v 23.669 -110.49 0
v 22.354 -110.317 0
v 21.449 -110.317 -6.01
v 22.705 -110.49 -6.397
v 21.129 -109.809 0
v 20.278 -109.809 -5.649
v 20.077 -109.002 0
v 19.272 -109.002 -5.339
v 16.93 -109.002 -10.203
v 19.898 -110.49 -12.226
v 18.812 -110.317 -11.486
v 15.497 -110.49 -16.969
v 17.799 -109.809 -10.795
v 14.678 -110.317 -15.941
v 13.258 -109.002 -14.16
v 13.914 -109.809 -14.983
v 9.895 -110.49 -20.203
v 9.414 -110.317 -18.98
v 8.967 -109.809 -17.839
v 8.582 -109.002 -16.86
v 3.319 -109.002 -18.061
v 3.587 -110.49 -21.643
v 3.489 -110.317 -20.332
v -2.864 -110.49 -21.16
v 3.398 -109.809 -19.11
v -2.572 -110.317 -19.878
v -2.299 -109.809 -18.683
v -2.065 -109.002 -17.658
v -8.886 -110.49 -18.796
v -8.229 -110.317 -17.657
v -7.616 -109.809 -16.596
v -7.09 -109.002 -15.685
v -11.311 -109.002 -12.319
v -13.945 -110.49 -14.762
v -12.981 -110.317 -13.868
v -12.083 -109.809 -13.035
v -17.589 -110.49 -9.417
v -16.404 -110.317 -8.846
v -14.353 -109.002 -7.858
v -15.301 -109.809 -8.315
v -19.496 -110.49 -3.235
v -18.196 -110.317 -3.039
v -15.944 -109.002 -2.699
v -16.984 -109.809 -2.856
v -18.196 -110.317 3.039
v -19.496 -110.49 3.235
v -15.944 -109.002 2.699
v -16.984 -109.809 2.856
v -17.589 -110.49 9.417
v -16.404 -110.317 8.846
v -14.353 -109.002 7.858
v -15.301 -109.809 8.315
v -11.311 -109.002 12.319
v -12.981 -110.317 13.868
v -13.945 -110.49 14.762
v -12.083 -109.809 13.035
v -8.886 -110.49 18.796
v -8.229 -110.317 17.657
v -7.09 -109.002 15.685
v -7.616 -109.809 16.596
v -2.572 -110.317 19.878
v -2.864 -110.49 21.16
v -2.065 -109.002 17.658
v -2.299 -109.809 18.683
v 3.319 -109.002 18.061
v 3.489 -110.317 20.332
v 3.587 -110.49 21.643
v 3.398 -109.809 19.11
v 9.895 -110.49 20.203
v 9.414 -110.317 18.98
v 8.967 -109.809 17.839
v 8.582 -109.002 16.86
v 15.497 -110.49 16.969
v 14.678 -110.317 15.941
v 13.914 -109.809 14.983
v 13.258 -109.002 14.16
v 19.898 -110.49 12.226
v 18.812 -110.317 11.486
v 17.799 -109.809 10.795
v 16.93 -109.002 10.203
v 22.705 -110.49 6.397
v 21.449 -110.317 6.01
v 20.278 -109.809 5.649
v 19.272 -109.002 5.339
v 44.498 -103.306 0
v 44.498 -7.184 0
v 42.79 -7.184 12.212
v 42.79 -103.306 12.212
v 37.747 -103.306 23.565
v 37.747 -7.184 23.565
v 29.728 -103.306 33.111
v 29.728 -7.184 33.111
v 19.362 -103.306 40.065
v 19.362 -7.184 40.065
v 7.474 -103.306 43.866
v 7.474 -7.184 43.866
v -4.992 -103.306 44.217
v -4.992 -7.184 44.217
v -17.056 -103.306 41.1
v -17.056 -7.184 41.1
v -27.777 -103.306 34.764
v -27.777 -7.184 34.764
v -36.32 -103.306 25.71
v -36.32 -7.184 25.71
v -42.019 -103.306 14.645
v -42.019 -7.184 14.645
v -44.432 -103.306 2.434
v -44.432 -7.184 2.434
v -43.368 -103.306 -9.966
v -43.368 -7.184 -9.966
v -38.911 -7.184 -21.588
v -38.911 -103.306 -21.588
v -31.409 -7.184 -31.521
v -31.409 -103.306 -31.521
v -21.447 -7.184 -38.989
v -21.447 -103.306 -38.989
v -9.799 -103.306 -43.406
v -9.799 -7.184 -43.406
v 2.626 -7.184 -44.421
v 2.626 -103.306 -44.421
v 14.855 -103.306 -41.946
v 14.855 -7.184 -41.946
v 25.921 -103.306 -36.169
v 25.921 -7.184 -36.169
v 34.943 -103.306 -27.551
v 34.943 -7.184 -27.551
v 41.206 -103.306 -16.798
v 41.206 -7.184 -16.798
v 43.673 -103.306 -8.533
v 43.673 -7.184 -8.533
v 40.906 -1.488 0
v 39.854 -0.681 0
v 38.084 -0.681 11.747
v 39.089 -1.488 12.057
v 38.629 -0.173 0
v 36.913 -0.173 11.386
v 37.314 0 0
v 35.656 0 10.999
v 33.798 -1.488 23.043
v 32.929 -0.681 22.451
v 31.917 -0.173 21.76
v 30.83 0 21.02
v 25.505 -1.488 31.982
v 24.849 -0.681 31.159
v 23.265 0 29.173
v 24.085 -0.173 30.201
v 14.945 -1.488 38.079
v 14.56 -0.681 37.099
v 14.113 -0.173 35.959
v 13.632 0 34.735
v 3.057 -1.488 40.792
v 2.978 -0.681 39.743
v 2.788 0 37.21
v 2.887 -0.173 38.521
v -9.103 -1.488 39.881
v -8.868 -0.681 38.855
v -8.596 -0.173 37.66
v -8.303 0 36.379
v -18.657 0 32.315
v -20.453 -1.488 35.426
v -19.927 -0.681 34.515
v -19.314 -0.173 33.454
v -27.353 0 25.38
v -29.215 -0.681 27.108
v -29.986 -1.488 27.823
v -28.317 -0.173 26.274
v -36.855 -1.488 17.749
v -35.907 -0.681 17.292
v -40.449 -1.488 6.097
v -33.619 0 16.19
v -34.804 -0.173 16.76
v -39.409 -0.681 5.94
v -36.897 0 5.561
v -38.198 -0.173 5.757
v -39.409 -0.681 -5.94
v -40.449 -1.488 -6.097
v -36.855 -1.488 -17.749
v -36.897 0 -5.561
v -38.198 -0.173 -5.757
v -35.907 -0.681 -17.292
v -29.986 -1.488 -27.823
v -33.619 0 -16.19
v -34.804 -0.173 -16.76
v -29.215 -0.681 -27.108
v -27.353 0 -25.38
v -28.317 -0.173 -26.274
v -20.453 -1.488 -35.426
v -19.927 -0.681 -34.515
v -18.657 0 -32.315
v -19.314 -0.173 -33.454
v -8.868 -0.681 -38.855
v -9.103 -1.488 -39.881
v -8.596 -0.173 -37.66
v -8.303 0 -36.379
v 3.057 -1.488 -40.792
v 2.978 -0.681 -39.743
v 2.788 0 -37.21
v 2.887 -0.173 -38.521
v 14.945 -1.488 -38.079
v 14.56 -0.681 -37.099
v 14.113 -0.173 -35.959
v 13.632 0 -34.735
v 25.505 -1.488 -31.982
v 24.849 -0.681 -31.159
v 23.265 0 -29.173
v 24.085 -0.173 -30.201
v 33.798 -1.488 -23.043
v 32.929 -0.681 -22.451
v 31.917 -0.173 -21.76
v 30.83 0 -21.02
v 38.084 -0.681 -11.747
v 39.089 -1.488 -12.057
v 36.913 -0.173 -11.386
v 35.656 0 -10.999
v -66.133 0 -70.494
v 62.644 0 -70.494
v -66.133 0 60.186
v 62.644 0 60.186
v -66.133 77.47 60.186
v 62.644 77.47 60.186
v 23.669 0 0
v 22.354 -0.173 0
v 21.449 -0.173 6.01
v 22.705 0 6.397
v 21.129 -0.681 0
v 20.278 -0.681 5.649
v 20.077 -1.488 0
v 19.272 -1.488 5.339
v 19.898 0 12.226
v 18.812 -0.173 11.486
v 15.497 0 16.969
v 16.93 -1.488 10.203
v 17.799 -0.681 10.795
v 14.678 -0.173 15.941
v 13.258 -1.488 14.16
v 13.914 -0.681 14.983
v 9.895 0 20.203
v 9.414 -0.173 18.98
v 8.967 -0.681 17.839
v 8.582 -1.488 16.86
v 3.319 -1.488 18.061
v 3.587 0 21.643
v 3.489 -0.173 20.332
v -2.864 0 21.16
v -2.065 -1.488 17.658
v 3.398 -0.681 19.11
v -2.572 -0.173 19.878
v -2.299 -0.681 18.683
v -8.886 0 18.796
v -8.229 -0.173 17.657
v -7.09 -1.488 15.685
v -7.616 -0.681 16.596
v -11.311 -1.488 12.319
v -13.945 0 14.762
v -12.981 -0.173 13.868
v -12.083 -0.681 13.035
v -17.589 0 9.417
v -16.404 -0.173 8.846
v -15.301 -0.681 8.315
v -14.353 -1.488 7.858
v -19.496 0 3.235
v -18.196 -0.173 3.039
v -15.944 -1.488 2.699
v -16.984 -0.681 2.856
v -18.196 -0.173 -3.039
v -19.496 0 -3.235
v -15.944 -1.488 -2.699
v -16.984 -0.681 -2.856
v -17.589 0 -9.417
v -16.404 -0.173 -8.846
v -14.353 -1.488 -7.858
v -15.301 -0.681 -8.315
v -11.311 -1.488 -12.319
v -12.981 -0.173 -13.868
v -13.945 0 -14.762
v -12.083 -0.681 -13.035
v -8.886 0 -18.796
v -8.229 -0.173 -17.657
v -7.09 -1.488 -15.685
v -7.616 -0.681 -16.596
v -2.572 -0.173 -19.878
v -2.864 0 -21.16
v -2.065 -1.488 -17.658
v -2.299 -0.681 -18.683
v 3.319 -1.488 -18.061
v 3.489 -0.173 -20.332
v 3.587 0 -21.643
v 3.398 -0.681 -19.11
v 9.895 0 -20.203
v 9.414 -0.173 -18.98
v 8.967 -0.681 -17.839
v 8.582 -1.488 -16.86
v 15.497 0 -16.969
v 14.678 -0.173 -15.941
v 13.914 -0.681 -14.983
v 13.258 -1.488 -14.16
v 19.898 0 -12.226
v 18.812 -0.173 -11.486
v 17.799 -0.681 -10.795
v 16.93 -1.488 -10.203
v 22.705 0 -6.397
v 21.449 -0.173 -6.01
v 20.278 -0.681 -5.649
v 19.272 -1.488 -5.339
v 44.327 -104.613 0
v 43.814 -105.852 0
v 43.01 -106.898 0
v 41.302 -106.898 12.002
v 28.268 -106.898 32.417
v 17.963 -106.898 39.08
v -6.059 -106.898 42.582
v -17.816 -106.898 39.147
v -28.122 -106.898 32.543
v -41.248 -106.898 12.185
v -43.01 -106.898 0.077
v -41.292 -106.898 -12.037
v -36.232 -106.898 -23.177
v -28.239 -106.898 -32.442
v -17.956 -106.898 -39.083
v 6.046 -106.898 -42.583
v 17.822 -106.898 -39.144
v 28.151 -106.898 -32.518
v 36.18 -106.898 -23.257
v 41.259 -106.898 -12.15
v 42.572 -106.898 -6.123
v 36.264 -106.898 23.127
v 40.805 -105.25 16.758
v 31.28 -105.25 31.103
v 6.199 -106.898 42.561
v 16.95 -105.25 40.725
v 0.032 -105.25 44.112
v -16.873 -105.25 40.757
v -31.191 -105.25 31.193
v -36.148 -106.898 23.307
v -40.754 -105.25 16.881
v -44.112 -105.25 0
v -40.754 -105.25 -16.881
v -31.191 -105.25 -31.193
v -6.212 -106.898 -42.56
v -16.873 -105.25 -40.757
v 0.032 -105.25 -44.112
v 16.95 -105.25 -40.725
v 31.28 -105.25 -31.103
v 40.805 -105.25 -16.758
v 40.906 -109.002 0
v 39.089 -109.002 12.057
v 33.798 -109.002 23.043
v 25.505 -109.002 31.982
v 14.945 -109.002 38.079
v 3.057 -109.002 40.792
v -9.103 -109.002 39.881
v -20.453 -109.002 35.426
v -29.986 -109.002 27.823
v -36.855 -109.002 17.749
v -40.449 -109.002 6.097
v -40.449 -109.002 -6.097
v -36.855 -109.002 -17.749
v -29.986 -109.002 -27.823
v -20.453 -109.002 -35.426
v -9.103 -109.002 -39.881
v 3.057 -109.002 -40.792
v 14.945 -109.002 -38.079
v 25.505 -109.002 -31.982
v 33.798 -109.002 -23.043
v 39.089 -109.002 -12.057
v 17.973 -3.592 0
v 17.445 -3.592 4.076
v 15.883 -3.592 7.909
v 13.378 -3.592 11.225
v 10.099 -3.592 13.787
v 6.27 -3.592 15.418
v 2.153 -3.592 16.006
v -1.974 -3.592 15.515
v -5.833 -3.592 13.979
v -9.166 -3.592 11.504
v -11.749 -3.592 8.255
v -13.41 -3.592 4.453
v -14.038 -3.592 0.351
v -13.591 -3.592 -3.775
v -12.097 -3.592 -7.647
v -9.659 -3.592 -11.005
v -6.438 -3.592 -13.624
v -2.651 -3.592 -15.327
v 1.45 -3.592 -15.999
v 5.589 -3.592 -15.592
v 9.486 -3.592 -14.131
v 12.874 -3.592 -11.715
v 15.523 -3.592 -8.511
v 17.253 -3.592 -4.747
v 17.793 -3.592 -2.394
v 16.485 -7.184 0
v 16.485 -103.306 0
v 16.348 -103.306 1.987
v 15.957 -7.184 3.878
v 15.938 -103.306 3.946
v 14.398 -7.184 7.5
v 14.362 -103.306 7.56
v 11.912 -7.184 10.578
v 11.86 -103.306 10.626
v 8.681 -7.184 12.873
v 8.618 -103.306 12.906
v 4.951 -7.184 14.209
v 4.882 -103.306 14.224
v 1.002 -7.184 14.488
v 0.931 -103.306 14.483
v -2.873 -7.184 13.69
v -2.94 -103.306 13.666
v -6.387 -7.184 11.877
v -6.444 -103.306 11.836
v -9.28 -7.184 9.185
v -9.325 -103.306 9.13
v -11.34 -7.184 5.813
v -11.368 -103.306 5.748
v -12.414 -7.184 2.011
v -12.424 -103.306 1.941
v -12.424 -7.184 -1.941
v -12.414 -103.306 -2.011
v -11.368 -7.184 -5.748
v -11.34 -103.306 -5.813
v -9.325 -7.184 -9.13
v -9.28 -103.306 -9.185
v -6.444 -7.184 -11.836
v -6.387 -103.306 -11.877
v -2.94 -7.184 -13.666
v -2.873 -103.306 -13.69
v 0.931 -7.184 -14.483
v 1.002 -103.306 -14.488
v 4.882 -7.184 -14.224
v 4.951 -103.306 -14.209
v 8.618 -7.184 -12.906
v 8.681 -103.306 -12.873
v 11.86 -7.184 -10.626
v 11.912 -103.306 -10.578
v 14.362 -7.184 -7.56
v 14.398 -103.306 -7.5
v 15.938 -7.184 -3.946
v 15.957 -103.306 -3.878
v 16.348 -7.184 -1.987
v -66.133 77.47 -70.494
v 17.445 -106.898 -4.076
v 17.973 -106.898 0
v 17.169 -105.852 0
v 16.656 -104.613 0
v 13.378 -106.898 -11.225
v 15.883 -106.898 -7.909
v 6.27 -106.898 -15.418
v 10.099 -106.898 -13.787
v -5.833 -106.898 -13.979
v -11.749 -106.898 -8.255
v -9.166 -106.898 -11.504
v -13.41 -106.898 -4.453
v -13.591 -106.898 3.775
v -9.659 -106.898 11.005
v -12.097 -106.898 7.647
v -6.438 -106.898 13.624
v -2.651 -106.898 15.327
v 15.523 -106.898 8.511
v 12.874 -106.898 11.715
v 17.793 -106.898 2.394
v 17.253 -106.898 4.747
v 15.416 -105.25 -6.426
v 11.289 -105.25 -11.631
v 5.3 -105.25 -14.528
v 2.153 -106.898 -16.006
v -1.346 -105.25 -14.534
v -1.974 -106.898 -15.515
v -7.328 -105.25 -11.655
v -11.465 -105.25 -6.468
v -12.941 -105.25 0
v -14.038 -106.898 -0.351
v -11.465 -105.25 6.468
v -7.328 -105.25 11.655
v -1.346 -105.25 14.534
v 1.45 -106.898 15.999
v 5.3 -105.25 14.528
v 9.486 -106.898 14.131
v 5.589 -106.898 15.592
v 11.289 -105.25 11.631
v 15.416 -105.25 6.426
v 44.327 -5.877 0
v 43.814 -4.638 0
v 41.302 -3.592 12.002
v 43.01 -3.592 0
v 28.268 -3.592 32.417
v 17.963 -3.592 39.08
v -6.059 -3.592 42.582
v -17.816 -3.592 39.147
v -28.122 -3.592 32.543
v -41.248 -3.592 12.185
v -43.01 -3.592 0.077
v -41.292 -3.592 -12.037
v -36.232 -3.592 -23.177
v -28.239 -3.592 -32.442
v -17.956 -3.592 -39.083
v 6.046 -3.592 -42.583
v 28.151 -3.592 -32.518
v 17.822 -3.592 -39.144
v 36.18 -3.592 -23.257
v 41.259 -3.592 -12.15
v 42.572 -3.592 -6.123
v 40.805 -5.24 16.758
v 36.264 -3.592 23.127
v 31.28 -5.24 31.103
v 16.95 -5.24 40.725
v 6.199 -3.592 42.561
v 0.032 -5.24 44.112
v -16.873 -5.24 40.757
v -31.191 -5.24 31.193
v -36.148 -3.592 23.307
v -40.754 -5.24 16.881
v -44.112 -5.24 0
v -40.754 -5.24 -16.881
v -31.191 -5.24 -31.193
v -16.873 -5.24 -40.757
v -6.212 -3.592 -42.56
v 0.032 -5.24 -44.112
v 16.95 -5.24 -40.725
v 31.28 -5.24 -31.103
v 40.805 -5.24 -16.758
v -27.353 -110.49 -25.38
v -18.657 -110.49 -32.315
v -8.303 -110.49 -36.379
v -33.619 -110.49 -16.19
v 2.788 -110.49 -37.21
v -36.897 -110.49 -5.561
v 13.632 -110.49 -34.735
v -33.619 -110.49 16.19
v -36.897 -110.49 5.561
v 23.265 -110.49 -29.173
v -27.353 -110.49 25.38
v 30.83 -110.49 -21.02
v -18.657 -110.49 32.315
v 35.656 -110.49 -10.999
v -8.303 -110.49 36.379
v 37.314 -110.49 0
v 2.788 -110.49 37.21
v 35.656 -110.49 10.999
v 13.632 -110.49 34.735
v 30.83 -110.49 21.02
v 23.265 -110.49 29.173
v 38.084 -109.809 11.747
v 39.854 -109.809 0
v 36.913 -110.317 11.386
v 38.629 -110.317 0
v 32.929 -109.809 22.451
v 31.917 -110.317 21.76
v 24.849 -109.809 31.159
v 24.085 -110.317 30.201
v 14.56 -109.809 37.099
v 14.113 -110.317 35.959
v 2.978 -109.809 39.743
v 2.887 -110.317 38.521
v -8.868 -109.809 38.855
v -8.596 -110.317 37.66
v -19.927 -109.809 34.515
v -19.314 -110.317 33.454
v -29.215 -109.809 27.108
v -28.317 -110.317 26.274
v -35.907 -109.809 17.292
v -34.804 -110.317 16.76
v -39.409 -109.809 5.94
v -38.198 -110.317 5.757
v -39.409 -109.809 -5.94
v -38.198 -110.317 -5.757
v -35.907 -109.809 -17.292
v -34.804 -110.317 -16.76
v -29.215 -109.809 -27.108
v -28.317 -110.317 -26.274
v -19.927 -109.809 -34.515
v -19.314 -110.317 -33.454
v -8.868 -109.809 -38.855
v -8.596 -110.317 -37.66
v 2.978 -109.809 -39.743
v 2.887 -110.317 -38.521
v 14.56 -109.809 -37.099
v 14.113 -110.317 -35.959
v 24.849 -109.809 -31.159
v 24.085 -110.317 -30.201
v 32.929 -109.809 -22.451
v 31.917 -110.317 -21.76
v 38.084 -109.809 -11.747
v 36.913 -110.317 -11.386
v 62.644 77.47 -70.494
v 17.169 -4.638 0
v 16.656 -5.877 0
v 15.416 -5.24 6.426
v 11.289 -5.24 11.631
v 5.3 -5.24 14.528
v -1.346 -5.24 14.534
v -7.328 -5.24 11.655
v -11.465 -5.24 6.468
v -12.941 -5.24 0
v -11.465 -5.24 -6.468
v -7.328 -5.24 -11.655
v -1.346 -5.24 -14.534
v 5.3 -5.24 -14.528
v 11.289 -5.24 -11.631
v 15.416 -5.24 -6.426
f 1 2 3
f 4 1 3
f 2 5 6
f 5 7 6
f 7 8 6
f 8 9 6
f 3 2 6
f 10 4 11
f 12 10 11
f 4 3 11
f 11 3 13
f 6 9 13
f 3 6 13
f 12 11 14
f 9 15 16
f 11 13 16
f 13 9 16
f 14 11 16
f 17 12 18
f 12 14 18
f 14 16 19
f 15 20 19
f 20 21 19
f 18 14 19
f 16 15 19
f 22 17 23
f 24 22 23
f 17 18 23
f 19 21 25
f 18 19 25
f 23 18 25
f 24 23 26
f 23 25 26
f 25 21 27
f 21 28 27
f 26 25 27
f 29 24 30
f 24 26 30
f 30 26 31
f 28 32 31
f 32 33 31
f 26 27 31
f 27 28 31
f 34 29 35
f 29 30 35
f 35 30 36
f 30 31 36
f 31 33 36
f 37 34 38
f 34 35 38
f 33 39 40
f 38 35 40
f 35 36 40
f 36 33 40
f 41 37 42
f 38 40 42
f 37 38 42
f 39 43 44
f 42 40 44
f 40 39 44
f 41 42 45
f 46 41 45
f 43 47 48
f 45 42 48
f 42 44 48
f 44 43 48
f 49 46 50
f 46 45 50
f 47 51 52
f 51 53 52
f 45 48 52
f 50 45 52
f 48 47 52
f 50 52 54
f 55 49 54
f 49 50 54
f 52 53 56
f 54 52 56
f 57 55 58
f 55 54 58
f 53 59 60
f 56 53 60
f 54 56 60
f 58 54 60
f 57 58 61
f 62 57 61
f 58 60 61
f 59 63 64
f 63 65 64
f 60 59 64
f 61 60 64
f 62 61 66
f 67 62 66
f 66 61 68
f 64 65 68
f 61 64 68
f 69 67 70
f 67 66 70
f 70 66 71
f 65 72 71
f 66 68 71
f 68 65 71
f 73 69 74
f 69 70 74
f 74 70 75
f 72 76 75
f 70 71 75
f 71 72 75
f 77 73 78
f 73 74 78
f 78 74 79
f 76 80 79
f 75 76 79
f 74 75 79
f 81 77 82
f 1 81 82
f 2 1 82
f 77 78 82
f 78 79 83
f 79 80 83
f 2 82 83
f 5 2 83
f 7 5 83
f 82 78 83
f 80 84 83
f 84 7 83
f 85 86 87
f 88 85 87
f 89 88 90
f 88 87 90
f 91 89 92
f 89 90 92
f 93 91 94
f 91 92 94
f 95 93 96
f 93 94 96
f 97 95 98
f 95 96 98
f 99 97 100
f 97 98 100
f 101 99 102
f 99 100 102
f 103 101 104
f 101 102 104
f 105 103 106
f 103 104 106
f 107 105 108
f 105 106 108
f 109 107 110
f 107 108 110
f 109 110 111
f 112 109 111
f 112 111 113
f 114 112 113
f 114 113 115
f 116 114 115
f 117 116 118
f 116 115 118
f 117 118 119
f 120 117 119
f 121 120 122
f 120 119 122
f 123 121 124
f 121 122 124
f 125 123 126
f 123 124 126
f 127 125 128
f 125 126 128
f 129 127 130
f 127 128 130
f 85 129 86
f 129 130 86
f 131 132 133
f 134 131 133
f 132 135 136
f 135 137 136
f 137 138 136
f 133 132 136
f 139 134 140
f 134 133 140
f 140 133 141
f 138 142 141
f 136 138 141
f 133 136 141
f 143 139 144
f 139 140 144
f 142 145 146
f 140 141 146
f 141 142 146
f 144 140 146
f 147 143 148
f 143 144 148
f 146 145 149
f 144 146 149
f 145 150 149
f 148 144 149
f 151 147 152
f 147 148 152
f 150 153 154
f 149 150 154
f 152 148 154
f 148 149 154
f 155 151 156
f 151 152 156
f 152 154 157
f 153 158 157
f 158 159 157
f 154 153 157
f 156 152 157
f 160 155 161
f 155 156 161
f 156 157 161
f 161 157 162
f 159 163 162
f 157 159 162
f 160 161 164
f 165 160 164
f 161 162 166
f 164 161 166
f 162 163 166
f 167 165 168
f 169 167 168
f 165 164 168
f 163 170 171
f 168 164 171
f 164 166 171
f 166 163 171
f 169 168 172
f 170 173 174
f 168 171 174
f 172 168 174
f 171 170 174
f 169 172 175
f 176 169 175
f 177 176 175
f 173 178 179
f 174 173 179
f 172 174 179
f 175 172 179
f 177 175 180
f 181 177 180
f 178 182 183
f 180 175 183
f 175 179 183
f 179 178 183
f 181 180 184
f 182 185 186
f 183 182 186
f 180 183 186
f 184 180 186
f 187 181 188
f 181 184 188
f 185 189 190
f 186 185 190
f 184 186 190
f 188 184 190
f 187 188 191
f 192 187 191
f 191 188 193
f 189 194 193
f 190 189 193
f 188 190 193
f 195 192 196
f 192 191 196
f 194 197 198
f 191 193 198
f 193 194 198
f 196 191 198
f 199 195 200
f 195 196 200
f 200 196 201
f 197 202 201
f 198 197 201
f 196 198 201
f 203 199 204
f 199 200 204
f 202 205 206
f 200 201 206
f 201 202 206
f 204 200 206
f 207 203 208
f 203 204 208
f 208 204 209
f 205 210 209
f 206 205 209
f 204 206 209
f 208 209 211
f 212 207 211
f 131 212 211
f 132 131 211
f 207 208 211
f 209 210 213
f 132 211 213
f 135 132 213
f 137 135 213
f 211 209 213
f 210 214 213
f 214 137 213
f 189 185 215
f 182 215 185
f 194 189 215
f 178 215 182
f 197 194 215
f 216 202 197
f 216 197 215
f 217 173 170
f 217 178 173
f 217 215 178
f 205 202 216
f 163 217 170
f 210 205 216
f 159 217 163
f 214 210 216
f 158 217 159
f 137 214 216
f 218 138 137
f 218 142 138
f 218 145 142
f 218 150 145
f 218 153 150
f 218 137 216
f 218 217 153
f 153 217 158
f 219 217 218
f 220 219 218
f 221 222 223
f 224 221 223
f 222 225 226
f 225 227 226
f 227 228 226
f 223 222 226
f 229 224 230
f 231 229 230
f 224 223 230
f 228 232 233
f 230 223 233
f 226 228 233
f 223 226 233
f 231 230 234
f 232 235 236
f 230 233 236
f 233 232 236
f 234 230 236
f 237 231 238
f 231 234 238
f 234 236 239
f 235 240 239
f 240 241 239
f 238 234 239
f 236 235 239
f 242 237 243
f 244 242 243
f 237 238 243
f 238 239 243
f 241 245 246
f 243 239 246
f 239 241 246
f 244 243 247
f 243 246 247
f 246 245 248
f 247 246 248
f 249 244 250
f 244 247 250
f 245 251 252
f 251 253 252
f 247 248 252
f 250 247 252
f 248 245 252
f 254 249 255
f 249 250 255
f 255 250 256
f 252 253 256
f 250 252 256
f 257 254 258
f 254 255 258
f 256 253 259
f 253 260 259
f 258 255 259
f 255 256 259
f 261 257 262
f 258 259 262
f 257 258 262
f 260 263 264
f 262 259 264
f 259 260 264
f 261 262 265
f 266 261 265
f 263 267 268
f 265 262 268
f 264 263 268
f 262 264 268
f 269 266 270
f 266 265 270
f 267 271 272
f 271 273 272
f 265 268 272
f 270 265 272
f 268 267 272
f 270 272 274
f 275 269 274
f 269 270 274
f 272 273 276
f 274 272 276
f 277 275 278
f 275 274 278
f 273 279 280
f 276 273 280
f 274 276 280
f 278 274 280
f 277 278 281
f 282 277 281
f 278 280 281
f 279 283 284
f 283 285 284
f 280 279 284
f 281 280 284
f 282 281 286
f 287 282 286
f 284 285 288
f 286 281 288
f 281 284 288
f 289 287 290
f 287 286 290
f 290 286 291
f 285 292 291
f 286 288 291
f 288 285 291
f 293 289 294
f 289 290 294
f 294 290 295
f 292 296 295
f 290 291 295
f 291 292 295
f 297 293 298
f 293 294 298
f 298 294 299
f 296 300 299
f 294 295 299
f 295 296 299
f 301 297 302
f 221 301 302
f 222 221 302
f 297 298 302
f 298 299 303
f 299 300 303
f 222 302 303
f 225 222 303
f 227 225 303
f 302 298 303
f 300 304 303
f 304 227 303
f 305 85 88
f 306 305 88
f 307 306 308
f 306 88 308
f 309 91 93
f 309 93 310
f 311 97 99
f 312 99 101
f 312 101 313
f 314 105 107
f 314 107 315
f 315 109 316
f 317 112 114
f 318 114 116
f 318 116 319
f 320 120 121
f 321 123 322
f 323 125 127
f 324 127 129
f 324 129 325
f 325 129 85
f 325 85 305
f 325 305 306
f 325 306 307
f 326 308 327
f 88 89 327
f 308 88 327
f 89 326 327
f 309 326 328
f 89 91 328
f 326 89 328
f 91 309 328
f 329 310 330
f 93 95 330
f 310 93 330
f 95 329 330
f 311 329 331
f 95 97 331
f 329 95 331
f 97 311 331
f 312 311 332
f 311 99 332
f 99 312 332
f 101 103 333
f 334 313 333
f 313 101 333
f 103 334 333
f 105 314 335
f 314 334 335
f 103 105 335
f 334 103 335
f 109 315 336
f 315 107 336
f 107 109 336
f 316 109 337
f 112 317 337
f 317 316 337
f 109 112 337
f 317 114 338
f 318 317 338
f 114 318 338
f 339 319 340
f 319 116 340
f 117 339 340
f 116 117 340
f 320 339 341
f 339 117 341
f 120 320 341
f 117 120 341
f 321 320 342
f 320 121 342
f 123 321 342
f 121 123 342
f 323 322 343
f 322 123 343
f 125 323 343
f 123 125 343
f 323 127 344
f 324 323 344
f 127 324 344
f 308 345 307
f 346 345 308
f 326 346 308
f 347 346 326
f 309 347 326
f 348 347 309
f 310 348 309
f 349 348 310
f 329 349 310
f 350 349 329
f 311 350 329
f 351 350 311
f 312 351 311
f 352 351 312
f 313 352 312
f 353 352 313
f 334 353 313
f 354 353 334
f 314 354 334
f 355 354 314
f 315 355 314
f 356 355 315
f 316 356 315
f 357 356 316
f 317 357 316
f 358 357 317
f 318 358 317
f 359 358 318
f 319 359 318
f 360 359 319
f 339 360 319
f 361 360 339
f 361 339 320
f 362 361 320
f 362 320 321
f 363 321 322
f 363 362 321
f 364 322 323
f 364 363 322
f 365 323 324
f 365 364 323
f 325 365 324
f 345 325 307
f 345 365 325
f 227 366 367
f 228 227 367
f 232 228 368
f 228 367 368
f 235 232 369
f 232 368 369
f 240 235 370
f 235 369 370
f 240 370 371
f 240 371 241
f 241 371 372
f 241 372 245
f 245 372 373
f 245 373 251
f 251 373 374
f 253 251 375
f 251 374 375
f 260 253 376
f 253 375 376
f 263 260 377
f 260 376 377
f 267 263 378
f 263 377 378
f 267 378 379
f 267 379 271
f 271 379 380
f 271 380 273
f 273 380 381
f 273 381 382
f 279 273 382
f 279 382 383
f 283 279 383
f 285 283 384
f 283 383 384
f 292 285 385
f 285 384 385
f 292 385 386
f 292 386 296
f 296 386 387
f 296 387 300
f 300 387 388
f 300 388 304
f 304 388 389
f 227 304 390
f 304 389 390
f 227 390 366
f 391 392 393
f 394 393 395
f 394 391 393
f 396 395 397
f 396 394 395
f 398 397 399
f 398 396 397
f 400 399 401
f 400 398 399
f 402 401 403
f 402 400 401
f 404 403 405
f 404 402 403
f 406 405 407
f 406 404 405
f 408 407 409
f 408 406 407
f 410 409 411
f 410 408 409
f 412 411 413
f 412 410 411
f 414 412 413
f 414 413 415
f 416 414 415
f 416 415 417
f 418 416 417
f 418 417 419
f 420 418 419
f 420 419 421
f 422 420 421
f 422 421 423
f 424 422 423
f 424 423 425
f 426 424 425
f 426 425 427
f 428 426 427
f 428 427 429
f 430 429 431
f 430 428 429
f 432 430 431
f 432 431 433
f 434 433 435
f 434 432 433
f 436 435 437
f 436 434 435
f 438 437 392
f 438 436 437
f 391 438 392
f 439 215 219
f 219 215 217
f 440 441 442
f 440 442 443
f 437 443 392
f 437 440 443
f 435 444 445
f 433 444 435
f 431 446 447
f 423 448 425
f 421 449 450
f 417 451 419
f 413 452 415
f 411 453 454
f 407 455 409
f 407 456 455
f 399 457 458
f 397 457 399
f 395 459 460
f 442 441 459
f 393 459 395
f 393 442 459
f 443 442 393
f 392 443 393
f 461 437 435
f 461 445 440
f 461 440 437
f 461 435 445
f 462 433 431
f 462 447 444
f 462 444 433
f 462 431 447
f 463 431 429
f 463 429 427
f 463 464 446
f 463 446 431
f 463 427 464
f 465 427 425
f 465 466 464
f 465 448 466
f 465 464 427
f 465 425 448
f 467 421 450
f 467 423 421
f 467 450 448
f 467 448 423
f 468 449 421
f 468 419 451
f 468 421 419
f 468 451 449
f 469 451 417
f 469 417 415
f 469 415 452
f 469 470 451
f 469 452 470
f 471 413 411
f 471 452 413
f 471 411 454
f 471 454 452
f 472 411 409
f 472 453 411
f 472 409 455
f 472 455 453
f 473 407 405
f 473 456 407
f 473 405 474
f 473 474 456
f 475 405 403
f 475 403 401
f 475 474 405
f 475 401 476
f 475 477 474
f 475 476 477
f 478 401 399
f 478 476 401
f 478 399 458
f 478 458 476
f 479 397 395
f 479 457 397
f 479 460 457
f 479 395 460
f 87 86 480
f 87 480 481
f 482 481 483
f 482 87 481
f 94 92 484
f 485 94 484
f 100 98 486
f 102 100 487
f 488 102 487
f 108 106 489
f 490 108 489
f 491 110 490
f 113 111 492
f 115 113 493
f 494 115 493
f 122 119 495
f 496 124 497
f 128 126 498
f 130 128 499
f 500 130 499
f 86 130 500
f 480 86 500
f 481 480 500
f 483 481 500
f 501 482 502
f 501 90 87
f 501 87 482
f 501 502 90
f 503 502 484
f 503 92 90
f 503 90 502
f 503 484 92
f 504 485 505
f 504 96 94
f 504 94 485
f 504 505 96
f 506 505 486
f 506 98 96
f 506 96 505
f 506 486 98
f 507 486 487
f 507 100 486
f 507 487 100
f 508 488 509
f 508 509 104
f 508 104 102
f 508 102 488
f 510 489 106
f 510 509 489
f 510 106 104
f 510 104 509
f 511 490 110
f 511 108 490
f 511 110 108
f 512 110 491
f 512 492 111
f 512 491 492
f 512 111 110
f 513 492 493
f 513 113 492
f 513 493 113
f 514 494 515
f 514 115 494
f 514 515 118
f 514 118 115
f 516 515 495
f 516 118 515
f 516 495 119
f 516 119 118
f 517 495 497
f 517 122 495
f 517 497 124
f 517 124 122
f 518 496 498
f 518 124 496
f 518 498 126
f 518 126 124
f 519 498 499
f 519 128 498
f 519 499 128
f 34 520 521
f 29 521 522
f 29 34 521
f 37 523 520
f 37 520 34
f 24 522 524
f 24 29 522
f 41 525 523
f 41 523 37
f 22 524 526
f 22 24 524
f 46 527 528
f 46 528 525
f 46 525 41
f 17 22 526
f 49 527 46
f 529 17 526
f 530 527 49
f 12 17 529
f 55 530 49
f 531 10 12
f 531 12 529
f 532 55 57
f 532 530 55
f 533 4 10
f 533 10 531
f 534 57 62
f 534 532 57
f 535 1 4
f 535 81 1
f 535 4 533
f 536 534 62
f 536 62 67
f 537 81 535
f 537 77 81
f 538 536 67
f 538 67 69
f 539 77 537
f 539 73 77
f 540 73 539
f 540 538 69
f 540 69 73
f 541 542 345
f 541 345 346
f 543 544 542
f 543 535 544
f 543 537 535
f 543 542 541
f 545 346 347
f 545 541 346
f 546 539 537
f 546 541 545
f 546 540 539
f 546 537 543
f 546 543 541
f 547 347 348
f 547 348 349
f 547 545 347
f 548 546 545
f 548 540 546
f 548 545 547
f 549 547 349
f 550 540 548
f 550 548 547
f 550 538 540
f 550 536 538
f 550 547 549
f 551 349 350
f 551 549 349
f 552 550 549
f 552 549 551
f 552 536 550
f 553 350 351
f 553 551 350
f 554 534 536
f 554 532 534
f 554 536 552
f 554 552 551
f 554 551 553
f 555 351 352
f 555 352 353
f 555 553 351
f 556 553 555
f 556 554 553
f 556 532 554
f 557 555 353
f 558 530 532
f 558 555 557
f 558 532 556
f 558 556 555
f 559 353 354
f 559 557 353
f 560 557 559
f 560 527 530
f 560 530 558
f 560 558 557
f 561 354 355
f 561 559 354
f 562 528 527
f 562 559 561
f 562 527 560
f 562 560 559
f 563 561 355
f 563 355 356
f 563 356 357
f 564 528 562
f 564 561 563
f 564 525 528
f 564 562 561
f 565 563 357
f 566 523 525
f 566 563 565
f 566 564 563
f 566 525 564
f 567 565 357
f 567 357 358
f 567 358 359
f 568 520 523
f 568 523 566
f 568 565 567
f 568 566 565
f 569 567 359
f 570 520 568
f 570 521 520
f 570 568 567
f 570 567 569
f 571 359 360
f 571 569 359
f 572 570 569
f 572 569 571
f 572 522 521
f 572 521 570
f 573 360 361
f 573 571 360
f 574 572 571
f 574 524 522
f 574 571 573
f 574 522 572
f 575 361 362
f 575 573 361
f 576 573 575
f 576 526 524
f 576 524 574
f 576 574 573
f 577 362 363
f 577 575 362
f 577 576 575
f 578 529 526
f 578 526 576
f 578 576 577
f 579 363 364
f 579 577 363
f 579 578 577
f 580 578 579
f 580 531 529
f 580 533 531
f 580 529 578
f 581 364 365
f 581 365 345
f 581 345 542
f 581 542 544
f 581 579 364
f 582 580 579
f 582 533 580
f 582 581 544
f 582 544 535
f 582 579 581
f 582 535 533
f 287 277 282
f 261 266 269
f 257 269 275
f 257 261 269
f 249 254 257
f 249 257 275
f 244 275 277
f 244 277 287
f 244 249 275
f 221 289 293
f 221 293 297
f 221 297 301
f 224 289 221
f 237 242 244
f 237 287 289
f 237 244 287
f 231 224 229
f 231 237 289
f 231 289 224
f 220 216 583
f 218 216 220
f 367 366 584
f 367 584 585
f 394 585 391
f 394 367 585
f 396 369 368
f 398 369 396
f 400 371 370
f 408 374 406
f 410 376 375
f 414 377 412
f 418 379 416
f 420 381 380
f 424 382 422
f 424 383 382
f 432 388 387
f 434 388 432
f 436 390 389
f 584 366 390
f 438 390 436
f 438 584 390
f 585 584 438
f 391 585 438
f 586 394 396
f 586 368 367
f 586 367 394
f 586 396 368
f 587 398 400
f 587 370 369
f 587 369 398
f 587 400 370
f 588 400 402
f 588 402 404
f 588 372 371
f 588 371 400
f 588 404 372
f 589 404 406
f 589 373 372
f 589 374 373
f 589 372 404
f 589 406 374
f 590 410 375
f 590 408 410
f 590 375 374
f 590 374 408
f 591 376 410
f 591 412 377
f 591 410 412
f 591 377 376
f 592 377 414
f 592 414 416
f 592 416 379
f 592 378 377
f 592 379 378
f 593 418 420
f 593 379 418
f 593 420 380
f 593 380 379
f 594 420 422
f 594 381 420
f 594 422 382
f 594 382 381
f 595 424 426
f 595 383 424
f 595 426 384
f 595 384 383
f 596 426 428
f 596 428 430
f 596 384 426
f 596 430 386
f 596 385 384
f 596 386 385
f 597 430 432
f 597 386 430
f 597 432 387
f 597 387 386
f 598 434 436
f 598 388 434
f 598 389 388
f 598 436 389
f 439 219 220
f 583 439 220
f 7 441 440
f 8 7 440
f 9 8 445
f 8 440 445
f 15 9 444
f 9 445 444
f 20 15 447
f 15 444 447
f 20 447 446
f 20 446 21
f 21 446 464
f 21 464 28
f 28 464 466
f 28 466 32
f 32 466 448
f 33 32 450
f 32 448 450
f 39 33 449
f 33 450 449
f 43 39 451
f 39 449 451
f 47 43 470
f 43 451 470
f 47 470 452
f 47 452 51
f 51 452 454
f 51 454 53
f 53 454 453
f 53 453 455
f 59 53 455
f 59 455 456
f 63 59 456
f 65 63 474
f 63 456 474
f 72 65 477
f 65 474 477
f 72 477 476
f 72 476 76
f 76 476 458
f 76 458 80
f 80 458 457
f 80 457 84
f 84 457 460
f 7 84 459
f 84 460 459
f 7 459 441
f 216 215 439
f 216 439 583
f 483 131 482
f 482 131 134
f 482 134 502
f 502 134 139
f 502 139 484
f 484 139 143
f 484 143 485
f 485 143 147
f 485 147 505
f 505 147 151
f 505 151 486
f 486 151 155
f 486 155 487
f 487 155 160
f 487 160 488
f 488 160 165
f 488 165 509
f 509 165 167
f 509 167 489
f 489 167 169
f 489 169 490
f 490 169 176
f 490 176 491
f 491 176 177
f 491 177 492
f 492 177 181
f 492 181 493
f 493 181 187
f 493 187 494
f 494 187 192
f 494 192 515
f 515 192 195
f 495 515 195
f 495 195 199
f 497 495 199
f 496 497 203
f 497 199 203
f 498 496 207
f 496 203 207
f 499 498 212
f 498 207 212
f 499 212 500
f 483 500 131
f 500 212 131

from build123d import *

# Parameters (mm, degrees)
F0_R     = 44.4983776942
F1_DEPTH = 110.49
F2_R     = 14.5195610464
F3_DEPTH = 202.946
F4_SIZE  = 5.08
F5_R     = 5.08
F6_W     = 128.777243197
F6_H     = 130.6803599
F7_DEPTH = 77.47


with BuildPart() as f1:
    # F0 (on Front) → F1 (new body)
    with BuildSketch(Plane.XZ):
        Circle(F0_R)
    extrude(amount=F1_DEPTH)

    # F2 (on Front) → F3 (cut)
    with BuildSketch(Plane.XZ):
        with Locations((1.9654189236, 0)):
            Circle(F2_R)
    extrude(amount=F3_DEPTH, mode=Mode.SUBTRACT)

    # F4
    f4_edges = [f1.edges().sort_by_distance(p)[0] for p in [
        (-12.554142, -110.49, 0),
        (-12.554142, 0, 0),
        (-44.498378, -110.49, 0),
        (-44.498378, 0, 0),
    ]]
    chamfer(f4_edges, length=F4_SIZE)

    # F5
    f5_edges = [f1.edges().sort_by_distance(p)[0] for p in [
        (-44.498378, -105.41, 0),
        (-39.418378, -110.49, 0),
        (-44.498378, -5.08, 0),
        (-39.418378, 0, 0),
        (-12.554142, -105.41, 0),
        (-17.634142, -110.49, 0),
        (19.02498, -2.54, 0),
        (-17.634142, 0, 0),
        (-12.554142, -5.08, 0),
    ]]
    fillet(f5_edges, radius=F5_R)

    # F6 (on Front) → F7 (join)
    with BuildSketch(Plane.XZ):
        with Locations((-1.7445199192, -5.1542632282)):
            Rectangle(F6_W, F6_H)
    extrude(amount=-F7_DEPTH)


solid = f1.part
